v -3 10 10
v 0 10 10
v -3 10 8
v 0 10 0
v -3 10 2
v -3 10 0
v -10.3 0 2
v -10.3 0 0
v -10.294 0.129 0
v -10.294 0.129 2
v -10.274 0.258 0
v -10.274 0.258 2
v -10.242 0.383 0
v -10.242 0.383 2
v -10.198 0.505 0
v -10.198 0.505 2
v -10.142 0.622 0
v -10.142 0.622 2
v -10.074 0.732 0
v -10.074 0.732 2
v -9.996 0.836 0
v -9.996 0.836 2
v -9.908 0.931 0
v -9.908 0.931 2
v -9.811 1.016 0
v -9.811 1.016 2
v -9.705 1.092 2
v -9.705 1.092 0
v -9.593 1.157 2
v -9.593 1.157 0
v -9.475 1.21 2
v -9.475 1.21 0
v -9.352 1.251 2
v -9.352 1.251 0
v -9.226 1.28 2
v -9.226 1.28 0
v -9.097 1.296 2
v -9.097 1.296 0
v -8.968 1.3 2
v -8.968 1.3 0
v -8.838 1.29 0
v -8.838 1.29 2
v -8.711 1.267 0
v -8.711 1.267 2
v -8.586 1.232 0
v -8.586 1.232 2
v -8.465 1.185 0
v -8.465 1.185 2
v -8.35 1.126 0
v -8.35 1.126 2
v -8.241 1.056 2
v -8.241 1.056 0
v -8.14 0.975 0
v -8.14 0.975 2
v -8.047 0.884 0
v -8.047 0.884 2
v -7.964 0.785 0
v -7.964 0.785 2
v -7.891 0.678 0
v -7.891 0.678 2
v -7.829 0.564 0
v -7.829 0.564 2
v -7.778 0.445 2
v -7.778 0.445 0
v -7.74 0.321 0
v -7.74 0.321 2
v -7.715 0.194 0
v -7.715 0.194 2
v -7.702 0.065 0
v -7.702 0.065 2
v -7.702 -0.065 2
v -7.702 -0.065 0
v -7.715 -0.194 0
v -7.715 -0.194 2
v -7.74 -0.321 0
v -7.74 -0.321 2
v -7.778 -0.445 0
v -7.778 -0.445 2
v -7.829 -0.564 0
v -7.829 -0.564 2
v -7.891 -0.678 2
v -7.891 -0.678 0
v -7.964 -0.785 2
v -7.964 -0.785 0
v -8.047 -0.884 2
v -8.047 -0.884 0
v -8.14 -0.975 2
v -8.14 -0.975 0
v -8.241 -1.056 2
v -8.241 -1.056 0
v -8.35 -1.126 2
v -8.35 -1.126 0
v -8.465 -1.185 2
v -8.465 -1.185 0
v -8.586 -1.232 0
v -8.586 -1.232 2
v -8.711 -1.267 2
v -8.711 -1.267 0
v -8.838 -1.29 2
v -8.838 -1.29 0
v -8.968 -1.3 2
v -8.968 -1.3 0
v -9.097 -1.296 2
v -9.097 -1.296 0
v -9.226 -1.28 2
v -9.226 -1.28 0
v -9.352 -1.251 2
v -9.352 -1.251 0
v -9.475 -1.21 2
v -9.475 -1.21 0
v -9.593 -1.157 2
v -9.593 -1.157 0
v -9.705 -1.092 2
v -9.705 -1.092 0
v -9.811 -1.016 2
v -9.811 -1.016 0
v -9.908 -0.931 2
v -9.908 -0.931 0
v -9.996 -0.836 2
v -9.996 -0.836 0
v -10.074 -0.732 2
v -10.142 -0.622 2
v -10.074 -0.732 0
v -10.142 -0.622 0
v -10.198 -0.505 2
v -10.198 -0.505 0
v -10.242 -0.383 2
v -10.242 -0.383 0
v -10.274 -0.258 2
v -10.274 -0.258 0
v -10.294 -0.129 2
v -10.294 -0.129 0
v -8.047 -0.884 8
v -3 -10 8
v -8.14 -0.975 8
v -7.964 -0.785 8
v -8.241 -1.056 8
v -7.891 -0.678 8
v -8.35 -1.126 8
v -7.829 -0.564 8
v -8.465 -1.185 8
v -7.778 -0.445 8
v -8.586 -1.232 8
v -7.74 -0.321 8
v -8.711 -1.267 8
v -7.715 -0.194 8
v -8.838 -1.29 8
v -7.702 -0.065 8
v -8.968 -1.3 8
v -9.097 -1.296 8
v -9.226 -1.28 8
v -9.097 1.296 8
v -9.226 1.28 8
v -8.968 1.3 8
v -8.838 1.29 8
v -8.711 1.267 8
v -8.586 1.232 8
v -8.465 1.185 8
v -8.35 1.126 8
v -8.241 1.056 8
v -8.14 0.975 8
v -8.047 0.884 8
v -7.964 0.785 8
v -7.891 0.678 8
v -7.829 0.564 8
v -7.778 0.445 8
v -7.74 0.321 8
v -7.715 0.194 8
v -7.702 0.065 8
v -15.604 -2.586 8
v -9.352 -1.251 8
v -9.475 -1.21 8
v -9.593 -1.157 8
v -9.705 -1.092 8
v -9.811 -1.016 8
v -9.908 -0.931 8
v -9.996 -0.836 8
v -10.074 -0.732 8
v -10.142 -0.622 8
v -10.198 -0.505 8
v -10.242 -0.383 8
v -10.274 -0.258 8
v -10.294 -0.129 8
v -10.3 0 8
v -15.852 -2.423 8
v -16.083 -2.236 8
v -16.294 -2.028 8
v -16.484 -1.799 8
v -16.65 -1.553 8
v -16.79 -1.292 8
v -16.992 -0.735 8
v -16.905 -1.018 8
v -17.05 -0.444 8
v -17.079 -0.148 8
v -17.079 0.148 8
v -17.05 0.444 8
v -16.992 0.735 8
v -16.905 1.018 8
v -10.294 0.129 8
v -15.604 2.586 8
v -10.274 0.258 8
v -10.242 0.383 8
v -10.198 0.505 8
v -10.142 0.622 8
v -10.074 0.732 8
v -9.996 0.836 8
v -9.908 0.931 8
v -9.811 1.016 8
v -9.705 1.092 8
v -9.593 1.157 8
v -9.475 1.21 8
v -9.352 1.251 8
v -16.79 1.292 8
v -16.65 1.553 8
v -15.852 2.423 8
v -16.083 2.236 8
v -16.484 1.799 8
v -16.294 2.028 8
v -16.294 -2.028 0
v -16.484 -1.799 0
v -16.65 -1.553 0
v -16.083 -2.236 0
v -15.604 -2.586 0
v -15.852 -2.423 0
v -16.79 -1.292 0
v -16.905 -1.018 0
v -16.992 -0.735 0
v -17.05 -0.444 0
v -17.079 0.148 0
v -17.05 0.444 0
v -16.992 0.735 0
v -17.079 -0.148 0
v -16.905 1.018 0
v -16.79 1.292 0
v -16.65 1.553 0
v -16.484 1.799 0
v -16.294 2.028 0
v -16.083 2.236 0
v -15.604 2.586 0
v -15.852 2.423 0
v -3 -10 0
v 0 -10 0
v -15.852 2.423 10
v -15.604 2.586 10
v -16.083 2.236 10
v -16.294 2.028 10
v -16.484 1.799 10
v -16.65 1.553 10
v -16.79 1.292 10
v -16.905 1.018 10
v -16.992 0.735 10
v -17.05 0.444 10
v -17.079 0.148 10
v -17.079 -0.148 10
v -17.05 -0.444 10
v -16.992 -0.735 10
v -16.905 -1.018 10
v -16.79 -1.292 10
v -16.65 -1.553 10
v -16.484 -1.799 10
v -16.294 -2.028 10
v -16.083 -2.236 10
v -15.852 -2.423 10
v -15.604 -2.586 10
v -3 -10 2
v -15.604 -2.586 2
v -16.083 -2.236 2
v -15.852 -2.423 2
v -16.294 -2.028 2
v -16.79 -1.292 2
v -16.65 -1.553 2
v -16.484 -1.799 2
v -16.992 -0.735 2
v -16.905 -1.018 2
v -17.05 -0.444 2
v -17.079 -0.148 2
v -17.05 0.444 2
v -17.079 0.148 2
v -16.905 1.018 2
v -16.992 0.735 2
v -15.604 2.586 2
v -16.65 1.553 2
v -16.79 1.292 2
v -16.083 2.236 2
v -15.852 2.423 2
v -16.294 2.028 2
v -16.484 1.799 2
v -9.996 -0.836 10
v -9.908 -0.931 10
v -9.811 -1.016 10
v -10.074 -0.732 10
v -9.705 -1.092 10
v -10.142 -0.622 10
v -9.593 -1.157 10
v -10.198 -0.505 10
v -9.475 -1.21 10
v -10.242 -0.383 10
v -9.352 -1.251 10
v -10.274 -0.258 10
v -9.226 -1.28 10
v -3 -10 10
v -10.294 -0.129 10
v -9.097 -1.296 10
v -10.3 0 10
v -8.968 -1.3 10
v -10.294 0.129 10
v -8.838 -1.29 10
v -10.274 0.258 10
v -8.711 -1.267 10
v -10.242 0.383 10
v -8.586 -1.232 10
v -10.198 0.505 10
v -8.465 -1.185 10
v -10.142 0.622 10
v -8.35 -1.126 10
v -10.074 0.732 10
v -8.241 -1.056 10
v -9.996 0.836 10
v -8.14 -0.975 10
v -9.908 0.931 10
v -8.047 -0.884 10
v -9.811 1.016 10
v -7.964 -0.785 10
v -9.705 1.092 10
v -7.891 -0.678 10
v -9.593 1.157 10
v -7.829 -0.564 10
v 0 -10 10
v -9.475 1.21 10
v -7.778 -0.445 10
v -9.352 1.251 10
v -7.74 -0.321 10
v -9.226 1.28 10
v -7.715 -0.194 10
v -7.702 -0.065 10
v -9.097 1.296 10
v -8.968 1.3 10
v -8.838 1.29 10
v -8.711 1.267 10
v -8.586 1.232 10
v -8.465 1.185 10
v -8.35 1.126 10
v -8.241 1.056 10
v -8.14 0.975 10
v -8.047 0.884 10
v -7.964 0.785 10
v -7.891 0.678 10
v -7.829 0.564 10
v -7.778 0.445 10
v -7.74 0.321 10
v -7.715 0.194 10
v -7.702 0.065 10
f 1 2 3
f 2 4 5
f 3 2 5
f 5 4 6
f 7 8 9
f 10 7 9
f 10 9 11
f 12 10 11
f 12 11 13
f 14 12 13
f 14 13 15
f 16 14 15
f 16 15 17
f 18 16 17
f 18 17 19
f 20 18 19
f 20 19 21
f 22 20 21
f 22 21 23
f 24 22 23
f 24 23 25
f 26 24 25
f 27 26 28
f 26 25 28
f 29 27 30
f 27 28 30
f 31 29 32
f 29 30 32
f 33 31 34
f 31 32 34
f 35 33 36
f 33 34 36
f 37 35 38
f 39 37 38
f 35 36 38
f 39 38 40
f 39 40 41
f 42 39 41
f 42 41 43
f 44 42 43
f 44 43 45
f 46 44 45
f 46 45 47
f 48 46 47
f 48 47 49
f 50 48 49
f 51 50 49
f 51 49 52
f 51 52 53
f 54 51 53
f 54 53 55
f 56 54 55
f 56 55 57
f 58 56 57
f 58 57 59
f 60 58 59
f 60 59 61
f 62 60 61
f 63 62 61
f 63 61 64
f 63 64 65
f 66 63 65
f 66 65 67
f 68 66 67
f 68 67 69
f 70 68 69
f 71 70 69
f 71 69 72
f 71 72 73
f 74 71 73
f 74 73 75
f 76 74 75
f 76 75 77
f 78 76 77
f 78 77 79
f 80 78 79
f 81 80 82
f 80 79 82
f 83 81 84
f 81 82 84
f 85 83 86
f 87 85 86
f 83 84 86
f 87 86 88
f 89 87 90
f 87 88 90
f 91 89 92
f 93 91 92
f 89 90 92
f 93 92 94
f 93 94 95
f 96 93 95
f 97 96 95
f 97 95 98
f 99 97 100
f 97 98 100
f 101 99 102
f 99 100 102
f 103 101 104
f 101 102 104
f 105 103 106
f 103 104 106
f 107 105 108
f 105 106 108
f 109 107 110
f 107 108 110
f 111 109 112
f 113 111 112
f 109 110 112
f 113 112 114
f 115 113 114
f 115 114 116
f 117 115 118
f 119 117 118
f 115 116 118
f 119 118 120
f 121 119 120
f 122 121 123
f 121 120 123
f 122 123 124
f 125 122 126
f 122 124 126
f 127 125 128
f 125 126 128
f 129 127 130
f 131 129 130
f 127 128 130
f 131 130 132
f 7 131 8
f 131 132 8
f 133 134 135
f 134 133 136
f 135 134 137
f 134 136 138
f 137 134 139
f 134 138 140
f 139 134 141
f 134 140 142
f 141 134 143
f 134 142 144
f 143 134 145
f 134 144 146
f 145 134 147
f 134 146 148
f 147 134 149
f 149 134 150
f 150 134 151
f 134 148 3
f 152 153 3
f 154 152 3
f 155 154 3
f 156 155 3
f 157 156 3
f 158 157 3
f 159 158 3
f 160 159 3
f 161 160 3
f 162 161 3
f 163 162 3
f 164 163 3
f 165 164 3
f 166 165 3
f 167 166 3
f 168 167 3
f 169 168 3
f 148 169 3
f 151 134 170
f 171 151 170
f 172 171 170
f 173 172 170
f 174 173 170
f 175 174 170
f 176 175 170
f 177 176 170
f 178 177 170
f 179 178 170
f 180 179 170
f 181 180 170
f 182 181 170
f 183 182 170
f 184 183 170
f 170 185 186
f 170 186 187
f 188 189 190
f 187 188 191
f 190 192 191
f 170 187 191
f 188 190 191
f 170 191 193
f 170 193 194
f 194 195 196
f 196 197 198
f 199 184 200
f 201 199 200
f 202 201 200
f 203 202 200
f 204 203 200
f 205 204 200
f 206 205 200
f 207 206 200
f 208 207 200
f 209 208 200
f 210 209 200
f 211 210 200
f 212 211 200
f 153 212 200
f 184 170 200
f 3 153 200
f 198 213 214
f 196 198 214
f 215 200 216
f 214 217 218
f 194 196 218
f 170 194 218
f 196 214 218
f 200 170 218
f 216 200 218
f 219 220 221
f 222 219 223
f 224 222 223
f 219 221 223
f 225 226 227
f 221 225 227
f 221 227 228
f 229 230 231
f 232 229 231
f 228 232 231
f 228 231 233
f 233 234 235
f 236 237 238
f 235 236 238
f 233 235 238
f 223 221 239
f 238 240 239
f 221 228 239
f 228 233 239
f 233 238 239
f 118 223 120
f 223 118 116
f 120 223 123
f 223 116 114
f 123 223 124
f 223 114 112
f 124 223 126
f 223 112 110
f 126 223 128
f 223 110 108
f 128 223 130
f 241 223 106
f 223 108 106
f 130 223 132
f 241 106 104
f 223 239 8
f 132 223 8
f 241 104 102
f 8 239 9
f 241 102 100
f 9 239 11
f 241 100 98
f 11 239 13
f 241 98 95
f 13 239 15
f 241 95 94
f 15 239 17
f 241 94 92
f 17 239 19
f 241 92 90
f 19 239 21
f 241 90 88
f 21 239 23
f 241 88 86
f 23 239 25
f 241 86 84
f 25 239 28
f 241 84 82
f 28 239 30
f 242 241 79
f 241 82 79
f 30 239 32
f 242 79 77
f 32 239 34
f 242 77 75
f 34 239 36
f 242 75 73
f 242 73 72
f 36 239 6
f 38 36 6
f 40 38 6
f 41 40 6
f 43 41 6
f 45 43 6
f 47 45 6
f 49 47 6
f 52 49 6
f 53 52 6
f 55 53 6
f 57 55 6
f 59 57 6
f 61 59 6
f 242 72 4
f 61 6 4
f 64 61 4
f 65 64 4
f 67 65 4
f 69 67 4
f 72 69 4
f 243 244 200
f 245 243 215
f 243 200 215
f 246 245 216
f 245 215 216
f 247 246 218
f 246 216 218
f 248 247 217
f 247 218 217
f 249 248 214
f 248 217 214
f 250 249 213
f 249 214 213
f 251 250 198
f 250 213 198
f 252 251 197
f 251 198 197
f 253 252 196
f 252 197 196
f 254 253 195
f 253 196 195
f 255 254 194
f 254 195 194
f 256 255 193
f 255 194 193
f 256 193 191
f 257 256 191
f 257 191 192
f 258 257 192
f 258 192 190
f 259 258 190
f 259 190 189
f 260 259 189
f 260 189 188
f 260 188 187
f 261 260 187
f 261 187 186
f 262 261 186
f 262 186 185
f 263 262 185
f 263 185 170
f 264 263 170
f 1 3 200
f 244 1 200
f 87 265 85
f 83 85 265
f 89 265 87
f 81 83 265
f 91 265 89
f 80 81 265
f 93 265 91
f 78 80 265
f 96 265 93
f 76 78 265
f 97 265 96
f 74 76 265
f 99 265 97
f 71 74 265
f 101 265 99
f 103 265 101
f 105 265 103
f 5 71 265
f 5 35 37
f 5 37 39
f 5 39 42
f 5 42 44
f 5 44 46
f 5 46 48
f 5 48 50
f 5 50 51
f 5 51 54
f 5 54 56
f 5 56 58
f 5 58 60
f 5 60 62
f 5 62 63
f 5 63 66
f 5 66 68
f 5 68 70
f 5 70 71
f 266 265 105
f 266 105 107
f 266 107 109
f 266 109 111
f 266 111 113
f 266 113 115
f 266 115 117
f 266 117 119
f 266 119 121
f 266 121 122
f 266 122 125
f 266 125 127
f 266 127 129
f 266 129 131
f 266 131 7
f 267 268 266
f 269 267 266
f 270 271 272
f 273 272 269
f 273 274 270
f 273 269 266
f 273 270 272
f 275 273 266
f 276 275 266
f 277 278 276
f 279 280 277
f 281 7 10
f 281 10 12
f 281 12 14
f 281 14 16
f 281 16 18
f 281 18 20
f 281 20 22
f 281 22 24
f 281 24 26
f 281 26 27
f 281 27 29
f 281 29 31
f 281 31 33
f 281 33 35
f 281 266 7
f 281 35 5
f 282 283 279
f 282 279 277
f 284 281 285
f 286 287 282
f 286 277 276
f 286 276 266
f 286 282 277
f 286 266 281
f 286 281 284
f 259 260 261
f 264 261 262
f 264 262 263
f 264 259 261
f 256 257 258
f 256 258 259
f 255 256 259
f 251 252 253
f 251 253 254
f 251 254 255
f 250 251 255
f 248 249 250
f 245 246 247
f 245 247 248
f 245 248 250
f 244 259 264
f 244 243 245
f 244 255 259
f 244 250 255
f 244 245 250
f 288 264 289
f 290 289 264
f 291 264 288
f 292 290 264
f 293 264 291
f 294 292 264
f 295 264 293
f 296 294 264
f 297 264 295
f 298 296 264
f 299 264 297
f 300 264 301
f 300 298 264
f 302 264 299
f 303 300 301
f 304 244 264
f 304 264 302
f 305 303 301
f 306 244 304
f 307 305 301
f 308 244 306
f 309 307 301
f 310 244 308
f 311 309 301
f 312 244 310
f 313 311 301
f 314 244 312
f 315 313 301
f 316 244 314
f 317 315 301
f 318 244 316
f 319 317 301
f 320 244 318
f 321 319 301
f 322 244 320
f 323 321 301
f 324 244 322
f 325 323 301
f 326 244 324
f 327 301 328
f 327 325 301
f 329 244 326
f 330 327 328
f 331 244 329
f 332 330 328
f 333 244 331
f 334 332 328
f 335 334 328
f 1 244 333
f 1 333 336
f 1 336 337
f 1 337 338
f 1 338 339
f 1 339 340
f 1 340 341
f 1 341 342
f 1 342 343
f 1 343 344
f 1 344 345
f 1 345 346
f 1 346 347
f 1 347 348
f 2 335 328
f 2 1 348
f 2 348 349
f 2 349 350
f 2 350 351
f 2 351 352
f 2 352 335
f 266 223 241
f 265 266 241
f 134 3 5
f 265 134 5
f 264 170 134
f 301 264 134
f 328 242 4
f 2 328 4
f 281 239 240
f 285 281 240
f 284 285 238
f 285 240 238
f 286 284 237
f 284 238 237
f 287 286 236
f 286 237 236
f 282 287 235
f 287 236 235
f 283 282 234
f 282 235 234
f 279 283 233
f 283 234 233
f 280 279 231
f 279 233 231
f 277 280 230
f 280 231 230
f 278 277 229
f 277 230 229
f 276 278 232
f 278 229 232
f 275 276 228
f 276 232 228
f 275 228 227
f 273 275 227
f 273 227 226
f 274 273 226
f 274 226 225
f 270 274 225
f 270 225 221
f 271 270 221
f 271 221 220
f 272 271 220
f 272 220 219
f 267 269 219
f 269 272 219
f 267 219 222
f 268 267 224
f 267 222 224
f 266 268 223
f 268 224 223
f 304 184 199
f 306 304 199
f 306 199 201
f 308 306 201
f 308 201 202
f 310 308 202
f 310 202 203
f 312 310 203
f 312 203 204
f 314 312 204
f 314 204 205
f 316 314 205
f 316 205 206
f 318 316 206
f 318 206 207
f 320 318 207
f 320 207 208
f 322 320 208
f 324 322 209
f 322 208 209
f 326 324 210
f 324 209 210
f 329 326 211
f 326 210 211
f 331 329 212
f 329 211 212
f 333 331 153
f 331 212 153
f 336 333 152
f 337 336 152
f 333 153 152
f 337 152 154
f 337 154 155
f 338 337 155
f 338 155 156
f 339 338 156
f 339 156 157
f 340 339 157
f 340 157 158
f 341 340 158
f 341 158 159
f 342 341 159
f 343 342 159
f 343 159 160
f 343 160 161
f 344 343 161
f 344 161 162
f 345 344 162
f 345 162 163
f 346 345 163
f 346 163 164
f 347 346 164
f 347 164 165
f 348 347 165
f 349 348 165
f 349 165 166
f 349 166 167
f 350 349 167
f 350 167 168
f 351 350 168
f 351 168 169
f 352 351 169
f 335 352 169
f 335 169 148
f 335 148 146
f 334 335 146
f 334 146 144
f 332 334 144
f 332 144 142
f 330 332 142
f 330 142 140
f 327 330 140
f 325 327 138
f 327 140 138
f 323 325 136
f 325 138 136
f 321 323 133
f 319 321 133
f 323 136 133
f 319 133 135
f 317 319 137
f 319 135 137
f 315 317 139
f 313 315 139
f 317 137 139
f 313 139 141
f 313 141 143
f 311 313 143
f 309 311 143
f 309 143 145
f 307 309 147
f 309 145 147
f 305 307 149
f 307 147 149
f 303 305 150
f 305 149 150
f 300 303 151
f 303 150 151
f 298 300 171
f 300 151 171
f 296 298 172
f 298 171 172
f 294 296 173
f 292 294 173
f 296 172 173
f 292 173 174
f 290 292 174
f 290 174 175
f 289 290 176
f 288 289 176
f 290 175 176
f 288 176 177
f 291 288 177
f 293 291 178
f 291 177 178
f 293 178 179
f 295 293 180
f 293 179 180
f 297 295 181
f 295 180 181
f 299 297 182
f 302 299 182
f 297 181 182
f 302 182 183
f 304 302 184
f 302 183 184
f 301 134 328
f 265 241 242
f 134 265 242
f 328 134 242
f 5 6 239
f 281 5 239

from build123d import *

# Parameters (mm, degrees)
DODANIE_WYCI_GNI_CIE3_DEPTH = 10
SZKIC4_W                    = 6
SZKIC4_H                    = 24.913855362
WYTNIJ_WYCI_GNI_CIE2_DEPTH  = 22
OTW_R_POD_RUB_M21_D         = 2.6


with BuildPart() as part:
    # Szkic3 → Dodanie-wyciągnięcie3 (new body)
    with BuildSketch(Plane.XY):
        with BuildLine():
            Line((0, -10), (0, 10))
            Line((0, 10), (-3, 10))
            Line((-3, 10), (-15.604135503, 2.585802645))
            ThreePointArc((-15.604135503, 2.585802645), (-17.083075123, 0), (-15.604135503, -2.585802645))
            Line((-15.604135503, -2.585802645), (-3, -10))
            Line((-3, -10), (0, -10))
        make_face()
    extrude(amount=DODANIE_WYCI_GNI_CIE3_DEPTH)

    # Szkic4 → Wytnij-wyciągnięcie2 (cut)
    with BuildSketch(Plane(origin=(-25, 0, 0), x_dir=(0, 0, -1), z_dir=(1, 0, 0))):
        with Locations((-5, 0)):
            Rectangle(SZKIC4_W, SZKIC4_H)
    extrude(amount=WYTNIJ_WYCI_GNI_CIE2_DEPTH, mode=Mode.SUBTRACT)

    # Otwór pod śrubę M21 (through all)
    with Locations(Plane.XY.offset(10)):
        with Locations((-9, 0)):
            Hole(OTW_R_POD_RUB_M21_D / 2)


solid = part.part
